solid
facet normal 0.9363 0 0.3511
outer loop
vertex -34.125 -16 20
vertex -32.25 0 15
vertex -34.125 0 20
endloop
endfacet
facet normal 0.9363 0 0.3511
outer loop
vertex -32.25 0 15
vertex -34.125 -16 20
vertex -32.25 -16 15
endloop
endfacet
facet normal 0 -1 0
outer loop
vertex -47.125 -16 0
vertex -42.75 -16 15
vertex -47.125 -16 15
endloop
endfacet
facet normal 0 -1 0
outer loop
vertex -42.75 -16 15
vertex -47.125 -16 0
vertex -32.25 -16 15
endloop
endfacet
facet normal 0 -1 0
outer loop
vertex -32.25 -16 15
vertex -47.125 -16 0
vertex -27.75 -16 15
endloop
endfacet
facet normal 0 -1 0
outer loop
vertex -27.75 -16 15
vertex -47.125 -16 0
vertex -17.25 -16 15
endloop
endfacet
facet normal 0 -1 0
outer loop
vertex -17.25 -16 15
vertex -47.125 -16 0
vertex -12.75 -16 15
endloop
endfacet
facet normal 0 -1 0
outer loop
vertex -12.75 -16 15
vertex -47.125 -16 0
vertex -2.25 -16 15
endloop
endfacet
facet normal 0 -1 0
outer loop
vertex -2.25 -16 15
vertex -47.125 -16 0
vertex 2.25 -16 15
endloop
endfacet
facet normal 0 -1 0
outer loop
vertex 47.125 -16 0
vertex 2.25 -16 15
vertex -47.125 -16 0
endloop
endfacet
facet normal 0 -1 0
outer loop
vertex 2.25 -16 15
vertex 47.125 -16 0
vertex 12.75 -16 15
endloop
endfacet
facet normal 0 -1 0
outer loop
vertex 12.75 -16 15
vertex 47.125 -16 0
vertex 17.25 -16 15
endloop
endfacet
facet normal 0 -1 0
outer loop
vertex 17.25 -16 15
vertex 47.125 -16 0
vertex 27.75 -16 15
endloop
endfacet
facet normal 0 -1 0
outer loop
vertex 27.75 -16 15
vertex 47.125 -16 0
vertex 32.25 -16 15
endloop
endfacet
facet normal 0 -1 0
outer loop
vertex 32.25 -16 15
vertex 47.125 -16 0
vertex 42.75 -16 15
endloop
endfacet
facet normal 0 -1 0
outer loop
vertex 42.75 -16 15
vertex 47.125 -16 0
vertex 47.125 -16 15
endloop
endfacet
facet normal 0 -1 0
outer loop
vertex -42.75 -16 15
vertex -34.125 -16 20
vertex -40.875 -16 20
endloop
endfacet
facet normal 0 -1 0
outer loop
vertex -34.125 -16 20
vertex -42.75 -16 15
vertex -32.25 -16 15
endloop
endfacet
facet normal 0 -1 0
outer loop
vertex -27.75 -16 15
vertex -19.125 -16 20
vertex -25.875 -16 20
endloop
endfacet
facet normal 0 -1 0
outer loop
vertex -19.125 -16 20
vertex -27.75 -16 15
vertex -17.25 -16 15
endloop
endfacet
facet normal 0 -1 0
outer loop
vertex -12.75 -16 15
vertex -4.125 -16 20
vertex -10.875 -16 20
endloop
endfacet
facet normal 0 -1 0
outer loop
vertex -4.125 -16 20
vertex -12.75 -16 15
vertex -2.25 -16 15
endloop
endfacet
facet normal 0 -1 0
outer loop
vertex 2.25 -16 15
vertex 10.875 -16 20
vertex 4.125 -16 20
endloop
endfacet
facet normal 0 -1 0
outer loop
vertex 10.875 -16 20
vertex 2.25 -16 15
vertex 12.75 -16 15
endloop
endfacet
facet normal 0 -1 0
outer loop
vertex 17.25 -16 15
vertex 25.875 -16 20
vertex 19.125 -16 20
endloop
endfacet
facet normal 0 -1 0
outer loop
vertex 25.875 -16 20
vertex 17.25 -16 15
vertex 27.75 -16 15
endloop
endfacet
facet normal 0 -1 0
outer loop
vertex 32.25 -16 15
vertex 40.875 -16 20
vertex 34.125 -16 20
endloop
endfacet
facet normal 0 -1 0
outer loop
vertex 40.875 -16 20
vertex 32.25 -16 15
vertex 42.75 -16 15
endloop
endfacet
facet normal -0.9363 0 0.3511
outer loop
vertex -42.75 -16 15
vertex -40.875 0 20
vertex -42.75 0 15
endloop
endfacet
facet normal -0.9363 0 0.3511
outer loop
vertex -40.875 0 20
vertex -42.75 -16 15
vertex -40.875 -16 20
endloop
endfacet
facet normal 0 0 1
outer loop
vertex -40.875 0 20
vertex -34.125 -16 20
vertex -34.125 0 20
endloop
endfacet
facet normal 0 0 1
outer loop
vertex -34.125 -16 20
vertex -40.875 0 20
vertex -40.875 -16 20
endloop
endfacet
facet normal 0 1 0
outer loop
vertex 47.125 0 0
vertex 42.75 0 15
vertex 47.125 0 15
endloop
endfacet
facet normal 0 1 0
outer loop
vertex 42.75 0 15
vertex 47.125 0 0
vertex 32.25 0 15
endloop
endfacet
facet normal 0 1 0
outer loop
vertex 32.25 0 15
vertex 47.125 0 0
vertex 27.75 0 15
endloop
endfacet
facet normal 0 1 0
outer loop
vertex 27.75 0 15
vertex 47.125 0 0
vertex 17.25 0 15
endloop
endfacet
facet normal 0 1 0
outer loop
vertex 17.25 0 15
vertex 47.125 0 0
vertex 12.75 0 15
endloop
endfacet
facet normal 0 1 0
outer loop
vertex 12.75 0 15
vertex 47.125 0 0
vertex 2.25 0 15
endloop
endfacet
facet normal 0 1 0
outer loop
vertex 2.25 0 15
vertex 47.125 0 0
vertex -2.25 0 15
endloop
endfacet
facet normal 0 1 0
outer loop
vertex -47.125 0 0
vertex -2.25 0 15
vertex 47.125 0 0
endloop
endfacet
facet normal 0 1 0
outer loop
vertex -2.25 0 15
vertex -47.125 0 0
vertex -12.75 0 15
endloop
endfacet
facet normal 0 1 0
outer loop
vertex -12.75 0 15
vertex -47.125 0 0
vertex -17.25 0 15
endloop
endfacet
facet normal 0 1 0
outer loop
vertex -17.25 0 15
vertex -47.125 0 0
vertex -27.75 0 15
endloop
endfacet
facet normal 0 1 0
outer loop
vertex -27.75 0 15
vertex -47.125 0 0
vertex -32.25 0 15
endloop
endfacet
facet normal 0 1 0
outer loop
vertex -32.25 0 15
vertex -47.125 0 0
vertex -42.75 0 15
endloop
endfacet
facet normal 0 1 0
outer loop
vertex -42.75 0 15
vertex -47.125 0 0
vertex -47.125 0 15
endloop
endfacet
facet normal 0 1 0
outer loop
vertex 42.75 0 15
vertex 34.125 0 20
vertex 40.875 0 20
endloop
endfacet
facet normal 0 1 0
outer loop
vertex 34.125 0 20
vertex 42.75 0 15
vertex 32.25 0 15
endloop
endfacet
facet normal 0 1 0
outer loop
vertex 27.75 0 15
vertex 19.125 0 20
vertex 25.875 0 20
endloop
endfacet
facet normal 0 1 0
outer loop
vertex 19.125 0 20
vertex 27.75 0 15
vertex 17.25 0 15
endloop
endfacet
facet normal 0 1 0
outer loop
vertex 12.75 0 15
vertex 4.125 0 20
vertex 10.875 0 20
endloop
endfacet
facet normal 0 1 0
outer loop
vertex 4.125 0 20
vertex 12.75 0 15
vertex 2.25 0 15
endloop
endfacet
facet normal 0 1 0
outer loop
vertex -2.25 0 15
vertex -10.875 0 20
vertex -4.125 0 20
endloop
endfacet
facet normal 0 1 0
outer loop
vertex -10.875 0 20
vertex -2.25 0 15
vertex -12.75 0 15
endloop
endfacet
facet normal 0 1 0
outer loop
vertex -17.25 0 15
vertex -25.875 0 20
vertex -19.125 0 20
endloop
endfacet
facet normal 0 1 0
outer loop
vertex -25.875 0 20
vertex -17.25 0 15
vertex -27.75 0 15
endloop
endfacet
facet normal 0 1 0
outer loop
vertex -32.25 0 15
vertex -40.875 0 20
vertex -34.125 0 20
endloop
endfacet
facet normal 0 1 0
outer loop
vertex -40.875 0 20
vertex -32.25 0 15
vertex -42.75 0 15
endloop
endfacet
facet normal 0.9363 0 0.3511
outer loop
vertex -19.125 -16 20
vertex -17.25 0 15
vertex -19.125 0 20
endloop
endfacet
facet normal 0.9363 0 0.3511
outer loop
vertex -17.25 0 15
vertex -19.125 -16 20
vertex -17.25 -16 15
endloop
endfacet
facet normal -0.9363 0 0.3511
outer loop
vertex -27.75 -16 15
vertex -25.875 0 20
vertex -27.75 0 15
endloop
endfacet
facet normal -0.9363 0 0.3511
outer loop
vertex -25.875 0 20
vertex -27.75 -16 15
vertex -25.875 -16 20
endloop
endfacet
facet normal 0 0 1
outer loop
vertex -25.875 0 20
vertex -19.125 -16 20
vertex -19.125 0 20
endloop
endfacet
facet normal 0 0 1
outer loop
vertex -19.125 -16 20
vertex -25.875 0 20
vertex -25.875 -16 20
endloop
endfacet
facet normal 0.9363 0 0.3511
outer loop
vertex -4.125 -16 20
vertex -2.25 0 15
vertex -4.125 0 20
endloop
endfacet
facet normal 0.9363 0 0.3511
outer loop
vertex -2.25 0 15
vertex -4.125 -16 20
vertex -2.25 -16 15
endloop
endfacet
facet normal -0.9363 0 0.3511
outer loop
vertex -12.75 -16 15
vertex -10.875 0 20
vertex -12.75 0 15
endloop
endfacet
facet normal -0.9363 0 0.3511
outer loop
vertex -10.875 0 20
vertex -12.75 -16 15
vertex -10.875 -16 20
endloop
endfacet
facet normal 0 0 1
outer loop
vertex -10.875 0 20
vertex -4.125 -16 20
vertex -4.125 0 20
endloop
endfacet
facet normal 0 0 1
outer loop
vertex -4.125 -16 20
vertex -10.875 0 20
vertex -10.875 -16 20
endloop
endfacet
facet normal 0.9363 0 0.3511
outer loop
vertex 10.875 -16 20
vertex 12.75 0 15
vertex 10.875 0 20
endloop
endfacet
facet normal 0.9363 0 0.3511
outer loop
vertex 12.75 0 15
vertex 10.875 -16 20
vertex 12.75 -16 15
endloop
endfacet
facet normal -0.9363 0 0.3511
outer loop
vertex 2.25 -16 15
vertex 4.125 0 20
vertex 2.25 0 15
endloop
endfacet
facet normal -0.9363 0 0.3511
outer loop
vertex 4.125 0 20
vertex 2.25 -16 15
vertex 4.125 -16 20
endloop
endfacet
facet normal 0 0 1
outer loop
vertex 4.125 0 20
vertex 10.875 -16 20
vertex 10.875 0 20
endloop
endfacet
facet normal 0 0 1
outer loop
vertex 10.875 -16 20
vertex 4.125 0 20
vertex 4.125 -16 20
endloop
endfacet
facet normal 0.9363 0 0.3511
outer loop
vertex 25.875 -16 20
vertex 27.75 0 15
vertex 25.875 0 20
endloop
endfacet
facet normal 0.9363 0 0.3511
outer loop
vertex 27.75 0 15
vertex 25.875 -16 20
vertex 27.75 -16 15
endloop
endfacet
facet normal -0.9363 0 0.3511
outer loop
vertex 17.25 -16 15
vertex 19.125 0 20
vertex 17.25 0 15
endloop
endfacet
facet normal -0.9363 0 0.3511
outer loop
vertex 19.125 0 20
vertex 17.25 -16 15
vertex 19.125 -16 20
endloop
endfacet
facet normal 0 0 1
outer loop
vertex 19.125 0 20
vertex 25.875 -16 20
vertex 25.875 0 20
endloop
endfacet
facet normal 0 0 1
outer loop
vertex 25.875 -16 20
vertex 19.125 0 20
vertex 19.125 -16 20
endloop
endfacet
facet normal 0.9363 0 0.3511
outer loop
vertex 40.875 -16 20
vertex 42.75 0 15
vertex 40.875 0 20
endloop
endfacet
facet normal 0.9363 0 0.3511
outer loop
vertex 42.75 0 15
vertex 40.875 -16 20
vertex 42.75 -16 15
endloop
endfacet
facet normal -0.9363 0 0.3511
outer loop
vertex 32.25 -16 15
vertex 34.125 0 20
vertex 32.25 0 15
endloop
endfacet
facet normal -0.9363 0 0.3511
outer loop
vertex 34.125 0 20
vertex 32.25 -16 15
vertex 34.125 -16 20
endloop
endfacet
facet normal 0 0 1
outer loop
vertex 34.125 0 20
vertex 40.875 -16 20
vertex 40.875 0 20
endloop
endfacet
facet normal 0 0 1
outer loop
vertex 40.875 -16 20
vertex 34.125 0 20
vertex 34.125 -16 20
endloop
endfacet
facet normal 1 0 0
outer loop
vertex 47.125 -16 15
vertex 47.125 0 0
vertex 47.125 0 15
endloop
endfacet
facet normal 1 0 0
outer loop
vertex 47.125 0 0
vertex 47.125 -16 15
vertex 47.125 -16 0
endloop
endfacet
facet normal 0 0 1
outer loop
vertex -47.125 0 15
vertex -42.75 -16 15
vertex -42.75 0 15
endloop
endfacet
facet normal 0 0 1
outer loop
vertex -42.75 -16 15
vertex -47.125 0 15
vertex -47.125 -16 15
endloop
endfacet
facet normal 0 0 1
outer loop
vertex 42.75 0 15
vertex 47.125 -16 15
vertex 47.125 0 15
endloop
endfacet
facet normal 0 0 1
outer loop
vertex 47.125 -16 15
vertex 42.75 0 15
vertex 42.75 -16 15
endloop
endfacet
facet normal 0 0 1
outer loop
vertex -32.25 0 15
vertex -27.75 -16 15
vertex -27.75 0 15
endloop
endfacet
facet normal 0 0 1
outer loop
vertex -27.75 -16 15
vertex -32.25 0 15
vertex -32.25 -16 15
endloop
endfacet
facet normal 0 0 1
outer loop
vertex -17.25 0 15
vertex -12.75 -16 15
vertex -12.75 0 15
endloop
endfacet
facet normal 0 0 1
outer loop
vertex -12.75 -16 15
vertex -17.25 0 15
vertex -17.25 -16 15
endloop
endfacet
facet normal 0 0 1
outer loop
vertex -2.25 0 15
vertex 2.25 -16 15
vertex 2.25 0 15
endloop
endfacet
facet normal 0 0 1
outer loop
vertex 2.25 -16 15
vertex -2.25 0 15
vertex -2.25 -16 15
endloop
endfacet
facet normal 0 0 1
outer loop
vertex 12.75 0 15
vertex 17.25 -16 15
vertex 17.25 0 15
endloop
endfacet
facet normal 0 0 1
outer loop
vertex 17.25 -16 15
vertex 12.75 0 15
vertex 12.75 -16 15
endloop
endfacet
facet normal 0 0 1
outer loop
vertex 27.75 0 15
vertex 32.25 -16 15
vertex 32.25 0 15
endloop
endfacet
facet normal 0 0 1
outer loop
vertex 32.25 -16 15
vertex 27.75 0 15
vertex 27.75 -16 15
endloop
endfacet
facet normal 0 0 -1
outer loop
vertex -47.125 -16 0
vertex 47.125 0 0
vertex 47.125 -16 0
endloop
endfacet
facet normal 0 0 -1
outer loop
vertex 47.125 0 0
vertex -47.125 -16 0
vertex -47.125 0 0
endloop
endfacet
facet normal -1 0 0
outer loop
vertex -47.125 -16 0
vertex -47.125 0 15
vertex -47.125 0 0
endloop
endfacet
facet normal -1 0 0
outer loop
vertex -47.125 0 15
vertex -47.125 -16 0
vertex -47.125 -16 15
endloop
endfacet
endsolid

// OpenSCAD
$fn = 32;

// ----------------------------------------------------------------------
// Toothed rack, 6 teeth
// 15 mm pitch, 5 mm teeth
// ----------------------------------------------------------------------

// --- parameters (mm) ---
bar_w = 16;      // bar width (Y)
bar_h = 15;      // bar height (Z)
teeth = 6;       // number of teeth
pitch = 15;      // tooth pitch
tooth_h = 5;     // tooth height above the bar
root_w = 11.25;  // tooth width at the root
crest_w = 6.75;  // tooth width at the crest

// --- derived feature positions (mm) ---
span = (teeth - 1) * pitch;  // = 75   distance between the outer teeth
bar_l = span + root_w + 8;   // = 94.25   bar length: teeth plus 4 mm at each end
tooth_x = -span / 2;         // = -37.5   X of the first tooth
height = bar_h + tooth_h;    // = 20   overall height
feature_centers = [
  [tooth_x + 0 * pitch, -bar_w / 2],
  [tooth_x + 1 * pitch, -bar_w / 2],
  [tooth_x + 2 * pitch, -bar_w / 2],
  [tooth_x + 3 * pitch, -bar_w / 2],
  [tooth_x + 4 * pitch, -bar_w / 2],
  [tooth_x + 5 * pitch, -bar_w / 2]
];   // tooth centre line, drives the tooth loop

// bar with a rack of teeth, one extruded trapezoium per centre
module rack_tooth() {
  linear_extrude(height = bar_w)
    polygon(points = [
      [0, 0],
      [root_w, 0],
      [root_w / 2 + crest_w / 2, tooth_h + 1],
      [root_w / 2 - crest_w / 2, tooth_h + 1]
    ]);
}

union() {
  translate([-bar_l / 2, -bar_w, 0]) cube([bar_l, bar_w, bar_h]);
  for (centre = feature_centers)
    translate([centre[0] - root_w / 2, 0, bar_h - 1]) rotate([90, 0, 0]) rack_tooth();
}
